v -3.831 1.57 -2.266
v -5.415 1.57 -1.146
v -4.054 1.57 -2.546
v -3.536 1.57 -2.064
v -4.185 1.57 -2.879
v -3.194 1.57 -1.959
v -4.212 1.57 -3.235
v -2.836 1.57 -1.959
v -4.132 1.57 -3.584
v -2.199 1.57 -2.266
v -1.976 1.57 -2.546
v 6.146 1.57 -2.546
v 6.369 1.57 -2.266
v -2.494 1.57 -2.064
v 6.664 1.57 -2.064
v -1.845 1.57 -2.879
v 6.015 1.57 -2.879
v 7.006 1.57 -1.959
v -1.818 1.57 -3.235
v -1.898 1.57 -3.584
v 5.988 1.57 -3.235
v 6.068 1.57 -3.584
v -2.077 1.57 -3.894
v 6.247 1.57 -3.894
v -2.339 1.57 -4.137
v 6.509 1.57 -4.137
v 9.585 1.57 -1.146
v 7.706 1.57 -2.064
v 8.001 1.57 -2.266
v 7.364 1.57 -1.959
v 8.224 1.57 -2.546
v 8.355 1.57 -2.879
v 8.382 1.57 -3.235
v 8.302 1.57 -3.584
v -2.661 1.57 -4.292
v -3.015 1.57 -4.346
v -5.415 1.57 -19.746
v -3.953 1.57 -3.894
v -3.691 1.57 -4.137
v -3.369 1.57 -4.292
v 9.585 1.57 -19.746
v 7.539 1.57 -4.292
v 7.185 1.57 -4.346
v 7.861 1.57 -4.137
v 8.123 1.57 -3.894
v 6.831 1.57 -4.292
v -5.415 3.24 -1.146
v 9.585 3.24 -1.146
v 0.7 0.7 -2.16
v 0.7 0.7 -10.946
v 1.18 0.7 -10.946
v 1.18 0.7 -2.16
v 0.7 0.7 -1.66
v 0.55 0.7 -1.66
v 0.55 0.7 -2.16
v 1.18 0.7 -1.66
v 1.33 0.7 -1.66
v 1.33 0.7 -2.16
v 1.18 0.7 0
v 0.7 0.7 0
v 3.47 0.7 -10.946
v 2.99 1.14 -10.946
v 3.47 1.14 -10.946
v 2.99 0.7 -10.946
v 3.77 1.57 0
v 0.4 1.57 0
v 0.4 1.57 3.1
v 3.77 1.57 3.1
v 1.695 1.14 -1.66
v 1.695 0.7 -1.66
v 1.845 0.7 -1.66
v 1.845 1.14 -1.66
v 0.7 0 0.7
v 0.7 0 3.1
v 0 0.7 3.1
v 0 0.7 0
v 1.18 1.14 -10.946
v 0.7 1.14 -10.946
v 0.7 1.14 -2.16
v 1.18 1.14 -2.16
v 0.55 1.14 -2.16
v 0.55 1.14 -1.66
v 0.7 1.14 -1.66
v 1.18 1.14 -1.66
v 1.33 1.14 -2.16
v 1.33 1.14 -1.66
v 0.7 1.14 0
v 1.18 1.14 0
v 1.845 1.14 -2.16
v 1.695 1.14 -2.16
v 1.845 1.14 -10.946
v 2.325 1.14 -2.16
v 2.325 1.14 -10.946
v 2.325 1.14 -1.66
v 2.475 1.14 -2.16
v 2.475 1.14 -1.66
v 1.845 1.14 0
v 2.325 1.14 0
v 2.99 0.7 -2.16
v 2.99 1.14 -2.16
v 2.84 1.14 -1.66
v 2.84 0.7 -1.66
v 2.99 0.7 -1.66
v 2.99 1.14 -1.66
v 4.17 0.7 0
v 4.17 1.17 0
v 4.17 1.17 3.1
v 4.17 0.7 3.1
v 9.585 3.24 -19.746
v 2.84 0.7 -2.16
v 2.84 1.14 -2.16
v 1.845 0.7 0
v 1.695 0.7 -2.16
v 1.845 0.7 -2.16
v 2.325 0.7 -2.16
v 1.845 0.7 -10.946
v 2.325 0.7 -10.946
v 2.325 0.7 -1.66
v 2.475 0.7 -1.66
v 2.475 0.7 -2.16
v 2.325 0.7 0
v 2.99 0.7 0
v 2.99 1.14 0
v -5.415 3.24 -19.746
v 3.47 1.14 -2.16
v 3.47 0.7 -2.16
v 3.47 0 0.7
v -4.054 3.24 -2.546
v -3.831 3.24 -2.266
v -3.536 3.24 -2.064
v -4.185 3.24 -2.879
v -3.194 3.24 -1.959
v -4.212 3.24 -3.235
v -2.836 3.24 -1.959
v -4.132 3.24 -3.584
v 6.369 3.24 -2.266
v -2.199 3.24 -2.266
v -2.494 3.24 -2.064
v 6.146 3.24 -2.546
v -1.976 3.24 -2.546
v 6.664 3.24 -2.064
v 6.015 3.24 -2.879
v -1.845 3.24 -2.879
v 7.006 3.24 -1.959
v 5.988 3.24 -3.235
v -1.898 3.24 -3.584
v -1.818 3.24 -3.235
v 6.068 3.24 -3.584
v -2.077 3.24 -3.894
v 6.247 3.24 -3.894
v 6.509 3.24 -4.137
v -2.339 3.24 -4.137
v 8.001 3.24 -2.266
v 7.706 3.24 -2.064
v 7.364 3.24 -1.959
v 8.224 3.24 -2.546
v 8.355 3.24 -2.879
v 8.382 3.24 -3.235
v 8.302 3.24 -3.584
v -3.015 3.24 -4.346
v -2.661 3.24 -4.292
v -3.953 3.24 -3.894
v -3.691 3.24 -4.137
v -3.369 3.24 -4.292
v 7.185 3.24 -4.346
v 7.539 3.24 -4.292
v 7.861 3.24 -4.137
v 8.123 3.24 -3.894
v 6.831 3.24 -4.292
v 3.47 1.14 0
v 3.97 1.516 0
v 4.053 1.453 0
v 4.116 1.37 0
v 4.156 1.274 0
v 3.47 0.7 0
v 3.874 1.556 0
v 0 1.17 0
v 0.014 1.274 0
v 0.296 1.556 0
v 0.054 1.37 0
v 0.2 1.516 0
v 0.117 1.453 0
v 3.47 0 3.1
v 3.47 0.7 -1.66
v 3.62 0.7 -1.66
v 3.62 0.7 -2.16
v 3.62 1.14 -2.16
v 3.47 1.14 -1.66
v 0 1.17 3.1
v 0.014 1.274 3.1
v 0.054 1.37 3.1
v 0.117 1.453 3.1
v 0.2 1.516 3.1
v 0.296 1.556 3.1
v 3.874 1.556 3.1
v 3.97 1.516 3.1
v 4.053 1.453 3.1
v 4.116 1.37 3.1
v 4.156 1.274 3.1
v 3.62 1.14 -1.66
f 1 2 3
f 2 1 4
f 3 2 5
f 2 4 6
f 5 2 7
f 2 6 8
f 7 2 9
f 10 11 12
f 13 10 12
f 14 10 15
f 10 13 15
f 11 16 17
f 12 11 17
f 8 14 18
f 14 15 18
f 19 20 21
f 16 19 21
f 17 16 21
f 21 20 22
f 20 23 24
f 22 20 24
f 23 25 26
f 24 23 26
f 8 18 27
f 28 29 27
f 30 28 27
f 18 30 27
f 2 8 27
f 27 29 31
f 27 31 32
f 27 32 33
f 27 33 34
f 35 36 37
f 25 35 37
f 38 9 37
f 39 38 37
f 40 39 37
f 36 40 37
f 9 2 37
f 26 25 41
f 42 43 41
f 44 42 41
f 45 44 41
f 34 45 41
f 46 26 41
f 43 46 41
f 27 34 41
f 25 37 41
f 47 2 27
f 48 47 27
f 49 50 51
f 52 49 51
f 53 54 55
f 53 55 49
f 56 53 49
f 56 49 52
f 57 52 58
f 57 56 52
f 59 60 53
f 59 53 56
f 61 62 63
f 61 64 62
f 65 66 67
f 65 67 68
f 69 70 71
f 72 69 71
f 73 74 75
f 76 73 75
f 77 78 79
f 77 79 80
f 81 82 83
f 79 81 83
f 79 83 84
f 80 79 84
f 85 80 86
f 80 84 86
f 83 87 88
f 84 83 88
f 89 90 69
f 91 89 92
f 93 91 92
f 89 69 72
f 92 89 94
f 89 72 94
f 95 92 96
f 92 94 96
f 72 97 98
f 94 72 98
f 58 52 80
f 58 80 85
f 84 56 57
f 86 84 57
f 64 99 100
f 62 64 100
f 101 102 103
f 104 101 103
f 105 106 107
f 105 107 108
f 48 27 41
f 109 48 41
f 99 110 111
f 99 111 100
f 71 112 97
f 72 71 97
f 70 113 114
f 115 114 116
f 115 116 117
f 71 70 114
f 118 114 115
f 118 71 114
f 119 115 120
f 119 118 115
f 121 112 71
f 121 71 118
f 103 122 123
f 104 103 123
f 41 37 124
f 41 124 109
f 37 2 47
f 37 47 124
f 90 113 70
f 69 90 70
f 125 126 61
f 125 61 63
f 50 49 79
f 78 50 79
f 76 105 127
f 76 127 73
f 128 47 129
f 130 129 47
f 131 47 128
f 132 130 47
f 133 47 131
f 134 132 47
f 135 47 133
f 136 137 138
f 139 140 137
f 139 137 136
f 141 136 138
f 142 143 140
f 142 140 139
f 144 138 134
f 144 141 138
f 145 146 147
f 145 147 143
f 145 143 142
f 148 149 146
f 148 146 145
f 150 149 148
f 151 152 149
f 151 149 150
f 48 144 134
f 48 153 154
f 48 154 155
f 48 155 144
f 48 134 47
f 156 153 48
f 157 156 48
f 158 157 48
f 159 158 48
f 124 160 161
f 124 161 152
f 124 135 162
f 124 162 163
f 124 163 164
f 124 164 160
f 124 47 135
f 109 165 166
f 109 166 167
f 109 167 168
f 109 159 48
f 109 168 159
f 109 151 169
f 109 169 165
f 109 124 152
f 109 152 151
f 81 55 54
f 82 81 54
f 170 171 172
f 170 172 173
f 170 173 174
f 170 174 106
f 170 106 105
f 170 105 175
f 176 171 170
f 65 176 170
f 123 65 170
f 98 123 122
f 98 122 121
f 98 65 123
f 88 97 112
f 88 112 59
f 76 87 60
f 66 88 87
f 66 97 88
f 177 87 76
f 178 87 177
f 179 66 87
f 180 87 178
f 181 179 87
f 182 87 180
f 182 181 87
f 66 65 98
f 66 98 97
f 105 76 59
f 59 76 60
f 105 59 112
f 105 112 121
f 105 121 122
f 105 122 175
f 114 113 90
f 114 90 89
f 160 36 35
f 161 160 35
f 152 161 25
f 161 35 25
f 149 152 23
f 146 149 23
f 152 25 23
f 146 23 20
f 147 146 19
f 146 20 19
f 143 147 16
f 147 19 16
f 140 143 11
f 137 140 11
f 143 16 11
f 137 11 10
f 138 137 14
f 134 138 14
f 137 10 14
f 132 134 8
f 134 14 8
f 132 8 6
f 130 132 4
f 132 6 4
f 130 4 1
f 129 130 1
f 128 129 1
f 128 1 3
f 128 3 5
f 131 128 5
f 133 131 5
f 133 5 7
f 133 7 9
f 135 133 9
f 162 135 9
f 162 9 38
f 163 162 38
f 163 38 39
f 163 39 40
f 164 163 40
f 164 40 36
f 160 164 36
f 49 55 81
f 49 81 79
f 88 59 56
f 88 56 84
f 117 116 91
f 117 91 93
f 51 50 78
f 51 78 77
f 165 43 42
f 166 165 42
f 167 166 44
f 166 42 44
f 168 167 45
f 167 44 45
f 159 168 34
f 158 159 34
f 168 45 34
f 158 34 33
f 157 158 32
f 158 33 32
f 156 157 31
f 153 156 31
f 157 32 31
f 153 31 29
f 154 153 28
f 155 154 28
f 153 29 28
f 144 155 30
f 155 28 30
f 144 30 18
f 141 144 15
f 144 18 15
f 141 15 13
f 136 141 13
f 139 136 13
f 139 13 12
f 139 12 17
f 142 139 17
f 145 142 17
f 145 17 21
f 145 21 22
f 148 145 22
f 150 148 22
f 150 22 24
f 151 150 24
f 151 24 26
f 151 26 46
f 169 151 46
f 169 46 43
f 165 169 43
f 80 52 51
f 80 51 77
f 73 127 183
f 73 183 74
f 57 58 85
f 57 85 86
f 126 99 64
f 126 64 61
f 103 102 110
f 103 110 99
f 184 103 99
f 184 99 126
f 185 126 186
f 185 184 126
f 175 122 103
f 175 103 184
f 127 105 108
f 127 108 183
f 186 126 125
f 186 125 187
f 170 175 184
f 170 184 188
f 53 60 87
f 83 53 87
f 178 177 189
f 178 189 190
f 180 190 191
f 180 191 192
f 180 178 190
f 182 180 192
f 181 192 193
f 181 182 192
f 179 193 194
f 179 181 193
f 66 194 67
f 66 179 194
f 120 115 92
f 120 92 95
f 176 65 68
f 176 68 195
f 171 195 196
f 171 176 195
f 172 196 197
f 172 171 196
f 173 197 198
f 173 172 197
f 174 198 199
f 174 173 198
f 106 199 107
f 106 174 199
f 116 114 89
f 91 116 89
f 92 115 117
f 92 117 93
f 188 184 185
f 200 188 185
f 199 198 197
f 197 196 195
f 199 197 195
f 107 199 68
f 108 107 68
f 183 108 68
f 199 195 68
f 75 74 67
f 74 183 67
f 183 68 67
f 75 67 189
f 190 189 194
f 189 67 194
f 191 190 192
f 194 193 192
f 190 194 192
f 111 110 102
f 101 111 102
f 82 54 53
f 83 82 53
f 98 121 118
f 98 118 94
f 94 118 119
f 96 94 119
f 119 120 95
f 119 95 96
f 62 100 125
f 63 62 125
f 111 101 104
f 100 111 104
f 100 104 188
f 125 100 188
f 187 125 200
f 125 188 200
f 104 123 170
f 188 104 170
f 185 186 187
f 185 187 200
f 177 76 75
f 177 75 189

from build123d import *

# Parameters (mm, degrees)
RESSALTO_EXTRUS_O1_DEPTH = 3.1
ESBO_O3_W                = 0.48
ESBO_O3_H                = 0.44
RESSALTO_EXTRUS_O2_DEPTH = 16.26
CHANFRO1_SIZE            = 0.7
ESBO_O5_W                = 0.15
ESBO_O5_H                = 0.5
RESSALTO_EXTRUS_O4_DEPTH = 0.44
SKETCH2_W                = 15
SKETCH2_H                = 18.6
BOSS_EXTRUDE1_DEPTH      = 1.67
SKETCH3_W                = 2.77
SKETCH3_H                = 5.31438776
CUT_EXTRUDE1_DEPTH       = 0.7
SKETCH4_R                = 1.2
CUT_EXTRUDE2_DEPTH       = 2.7


with BuildPart() as part:
    # Esboço1 → Ressalto-extrusão1 (new body)
    with BuildSketch(Plane.XY):
        with BuildLine():
            Line((0.7, 0), (0, 0.7))
            Line((0, 0.7), (0, 1.17))
            ThreePointArc((0, 1.17), (0.117157288, 1.452842712), (0.4, 1.57))
            Line((0.4, 1.57), (3.77, 1.57))
            ThreePointArc((3.77, 1.57), (4.052842712, 1.452842712), (4.17, 1.17))
            Line((4.17, 1.17), (4.17, 0.7))
            Line((4.17, 0.7), (3.47, 0))
            Line((3.47, 0), (0.7, 0))
        make_face()
    extrude(amount=RESSALTO_EXTRUS_O1_DEPTH)

    # Esboço3 → Ressalto-extrusão2 (add)
    with BuildSketch(Plane.XY):
        with Locations((3.23, 0.92)):
            Rectangle(ESBO_O3_W, ESBO_O3_H)
        with Locations((0.94, 0.92)):
            Rectangle(ESBO_O3_W, ESBO_O3_H)
        with Locations((2.085, 0.92)):
            Rectangle(ESBO_O3_W, ESBO_O3_H)
    extrude(amount=-RESSALTO_EXTRUS_O2_DEPTH)

    # Chanfro1
    chanfro1_edges = [part.edges().sort_by_distance(p)[0] for p in [
        (2.085, 0, 0),
    ]]
    chamfer(chanfro1_edges, length=CHANFRO1_SIZE - 0.0001)  # a hair under: the kernel refuses the full size

    # Esboço5 → Ressalto-extrusão4 (add)
    with BuildSketch(Plane.XZ.offset(-0.7)):
        with Locations((0.625, -1.91)):
            Rectangle(ESBO_O5_W, ESBO_O5_H)
        with Locations((1.255, -1.91)):
            Rectangle(ESBO_O5_W, ESBO_O5_H)
        with Locations((2.4, -1.91)):
            Rectangle(ESBO_O5_W, ESBO_O5_H)
        with Locations((3.545, -1.91)):
            Rectangle(ESBO_O5_W, ESBO_O5_H)
        with Locations((1.77, -1.91)):
            Rectangle(ESBO_O5_W, ESBO_O5_H)
        with Locations((2.915, -1.91)):
            Rectangle(ESBO_O5_W, ESBO_O5_H)
    extrude(amount=-RESSALTO_EXTRUS_O4_DEPTH)

    # Sketch3 → Cut-Extrude1 (cut)
    with BuildSketch(Plane.XZ.offset(-0.7)):
        with Locations((2.085, -13.60280612)):
            Rectangle(SKETCH3_W, SKETCH3_H)
    extrude(amount=-CUT_EXTRUDE1_DEPTH, mode=Mode.SUBTRACT)


with BuildPart() as body_2:
    # Sketch2 → Boss-Extrude1 (new body)
    with BuildSketch(Plane(origin=(0, 1.57, 0), x_dir=(1, 0, 0), z_dir=(0, 1, 0))):
        with Locations((2.085, 10.44561224)):
            Rectangle(SKETCH2_W, SKETCH2_H)
    extrude(amount=BOSS_EXTRUDE1_DEPTH)

    # Sketch4 → Cut-Extrude2 (cut)
    with BuildSketch(Plane.XZ.offset(-1.57)):
        with Locations(Location((-3.015, -3.14561224, 0), (0, 0, 270))):
            Circle(SKETCH4_R)
        with Locations(Location((7.185, -3.14561224, 0), (0, 0, 270))):
            Circle(SKETCH4_R)
    extrude(amount=-CUT_EXTRUDE2_DEPTH, mode=Mode.SUBTRACT)


solid = Compound([part.part, body_2.part])
